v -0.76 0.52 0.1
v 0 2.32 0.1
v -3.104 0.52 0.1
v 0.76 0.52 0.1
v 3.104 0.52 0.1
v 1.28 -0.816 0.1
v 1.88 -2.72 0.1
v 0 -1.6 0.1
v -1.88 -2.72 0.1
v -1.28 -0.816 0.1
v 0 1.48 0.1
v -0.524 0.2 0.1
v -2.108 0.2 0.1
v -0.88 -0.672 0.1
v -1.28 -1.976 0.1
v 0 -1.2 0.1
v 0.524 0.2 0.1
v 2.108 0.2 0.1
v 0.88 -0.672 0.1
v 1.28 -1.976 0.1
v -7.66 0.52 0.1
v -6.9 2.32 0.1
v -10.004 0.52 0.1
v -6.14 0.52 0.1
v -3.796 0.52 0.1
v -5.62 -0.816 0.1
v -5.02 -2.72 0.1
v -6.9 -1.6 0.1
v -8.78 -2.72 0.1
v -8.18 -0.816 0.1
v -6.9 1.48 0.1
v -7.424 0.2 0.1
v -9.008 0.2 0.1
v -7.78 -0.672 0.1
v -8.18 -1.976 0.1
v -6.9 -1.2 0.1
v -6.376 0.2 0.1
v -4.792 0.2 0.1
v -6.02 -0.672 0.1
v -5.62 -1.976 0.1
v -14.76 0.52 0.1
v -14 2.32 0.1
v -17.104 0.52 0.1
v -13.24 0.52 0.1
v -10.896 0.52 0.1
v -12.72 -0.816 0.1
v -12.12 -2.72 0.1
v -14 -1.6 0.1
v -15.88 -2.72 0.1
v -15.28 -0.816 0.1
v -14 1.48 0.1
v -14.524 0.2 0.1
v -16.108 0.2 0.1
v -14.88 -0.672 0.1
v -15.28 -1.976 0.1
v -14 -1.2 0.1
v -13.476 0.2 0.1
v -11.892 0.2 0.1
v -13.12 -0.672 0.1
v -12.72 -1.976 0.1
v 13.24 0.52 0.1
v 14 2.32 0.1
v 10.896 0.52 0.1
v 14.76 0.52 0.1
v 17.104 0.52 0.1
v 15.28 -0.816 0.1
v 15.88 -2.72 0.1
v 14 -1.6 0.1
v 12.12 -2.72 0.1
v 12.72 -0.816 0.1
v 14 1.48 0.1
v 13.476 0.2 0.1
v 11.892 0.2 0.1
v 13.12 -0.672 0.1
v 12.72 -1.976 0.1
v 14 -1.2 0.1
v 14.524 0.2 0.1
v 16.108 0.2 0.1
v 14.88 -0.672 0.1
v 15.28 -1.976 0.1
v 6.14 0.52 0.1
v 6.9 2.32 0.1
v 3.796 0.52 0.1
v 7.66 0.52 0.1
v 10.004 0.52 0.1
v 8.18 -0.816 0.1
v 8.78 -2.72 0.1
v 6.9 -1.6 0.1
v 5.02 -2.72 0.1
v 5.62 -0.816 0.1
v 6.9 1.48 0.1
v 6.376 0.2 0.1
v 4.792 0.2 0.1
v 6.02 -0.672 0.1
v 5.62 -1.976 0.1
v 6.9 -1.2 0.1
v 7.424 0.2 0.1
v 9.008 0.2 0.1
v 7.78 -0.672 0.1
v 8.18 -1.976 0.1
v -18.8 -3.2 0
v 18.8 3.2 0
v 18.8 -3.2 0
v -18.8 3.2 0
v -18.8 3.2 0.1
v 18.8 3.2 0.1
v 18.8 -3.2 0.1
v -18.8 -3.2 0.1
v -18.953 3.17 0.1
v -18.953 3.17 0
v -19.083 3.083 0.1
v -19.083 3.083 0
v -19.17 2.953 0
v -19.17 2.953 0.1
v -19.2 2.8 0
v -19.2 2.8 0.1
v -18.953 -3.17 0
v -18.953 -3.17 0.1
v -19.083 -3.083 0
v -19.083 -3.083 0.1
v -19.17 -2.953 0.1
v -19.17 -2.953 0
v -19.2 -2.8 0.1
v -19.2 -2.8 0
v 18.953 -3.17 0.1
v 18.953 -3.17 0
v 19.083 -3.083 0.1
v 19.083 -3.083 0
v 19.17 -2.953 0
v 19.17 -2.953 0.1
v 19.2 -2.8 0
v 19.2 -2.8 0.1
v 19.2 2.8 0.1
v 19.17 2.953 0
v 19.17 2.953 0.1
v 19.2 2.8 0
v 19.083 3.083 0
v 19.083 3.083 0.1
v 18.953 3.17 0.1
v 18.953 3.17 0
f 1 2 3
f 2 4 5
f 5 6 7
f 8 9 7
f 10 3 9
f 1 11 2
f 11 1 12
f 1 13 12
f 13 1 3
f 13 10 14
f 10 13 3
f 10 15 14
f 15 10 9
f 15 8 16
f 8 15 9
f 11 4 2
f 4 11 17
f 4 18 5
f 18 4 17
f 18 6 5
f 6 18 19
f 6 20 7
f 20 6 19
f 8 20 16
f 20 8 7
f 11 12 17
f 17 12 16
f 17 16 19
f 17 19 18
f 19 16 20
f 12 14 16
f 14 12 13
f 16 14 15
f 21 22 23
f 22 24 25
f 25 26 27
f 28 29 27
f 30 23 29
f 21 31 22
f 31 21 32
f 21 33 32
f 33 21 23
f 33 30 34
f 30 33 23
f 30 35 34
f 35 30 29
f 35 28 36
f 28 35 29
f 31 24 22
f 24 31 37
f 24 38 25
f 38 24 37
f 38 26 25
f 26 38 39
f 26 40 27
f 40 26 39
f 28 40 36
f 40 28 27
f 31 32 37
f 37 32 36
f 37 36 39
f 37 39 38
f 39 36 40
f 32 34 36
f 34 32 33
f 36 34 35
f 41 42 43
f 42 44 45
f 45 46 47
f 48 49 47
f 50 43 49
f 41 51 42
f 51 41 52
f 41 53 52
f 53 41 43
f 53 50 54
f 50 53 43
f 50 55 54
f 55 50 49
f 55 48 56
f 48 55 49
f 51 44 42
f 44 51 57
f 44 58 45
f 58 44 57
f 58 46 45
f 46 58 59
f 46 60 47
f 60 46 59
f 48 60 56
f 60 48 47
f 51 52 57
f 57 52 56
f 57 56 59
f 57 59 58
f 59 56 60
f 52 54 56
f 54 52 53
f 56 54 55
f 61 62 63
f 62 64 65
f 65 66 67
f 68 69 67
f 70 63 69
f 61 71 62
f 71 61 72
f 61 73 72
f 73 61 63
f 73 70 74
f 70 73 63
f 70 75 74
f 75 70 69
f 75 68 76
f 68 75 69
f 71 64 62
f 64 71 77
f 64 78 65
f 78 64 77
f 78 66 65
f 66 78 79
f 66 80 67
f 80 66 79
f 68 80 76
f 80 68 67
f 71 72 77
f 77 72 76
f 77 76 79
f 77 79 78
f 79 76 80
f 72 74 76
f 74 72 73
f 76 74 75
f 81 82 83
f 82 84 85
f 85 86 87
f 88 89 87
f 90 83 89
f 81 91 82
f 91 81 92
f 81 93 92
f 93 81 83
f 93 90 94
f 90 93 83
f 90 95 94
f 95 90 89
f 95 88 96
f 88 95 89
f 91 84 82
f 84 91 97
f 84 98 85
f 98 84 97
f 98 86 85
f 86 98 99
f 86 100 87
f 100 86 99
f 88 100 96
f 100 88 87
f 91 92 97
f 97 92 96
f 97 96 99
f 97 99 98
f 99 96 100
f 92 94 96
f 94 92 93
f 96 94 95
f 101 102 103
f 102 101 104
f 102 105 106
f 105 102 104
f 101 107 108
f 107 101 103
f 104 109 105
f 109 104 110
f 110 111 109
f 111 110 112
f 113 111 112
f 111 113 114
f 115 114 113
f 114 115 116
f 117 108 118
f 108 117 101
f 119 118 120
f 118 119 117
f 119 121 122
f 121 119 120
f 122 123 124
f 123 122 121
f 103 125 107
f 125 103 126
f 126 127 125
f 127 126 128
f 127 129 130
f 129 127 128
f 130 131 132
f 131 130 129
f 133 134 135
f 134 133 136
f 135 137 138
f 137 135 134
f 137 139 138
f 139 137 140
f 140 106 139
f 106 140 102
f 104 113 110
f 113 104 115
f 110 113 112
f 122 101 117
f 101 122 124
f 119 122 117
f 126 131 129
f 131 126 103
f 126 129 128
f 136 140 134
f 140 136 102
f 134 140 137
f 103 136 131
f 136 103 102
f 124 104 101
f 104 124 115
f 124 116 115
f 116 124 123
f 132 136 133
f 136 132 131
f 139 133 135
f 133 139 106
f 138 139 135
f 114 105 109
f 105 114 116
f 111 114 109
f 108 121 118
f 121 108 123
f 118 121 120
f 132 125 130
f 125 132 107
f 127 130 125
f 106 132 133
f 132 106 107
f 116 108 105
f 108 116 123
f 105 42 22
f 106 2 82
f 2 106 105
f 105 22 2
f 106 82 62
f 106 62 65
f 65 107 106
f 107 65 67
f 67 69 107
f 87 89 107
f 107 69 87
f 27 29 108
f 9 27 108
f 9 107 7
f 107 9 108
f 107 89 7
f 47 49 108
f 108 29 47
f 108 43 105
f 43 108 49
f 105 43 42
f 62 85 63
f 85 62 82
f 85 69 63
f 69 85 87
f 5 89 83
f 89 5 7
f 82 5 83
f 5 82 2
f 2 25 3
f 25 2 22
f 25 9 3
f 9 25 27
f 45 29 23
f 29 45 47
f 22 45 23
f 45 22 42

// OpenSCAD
// file: s/4121723s10.scad
use <../../lib.scad>
function ldraw_lib__s__4121723s10() = [
// 0 ~Sticker with 5 Red Black Outlined Stars and Transparent Background -  Single Star
// 0 Name: s\4121723s10.dat
// 0 Author: Ulrich Röder [UR]
// 0 !LDRAW_ORG Subpart UPDATE 2022-06
// 0 !LICENSE Licensed under CC BY 2.0 and CC BY 4.0 : see CAreadme.txt
// 
// 0 BFC CERTIFY CCW
  [0,"BFC","CERTIFY"],
  [0,"BFC","CCW"],
// 
// 0 !HISTORY 2022-12-20 [PTadmin] Official Update 2022-06
// 
// 
// 3 16 -1.9 -.25 1.3 0 -.25 5.8 -7.76 -.25 1.3
  [3,16,-1.9,-.25,1.3,0,-.25,5.8,-7.76,-.25,1.3],
// 3 16 0 -.25 5.8 1.9 -.25 1.3 7.76 -.25 1.3
  [3,16,0,-.25,5.8,1.9,-.25,1.3,7.76,-.25,1.3],
// 3 16 7.76 -.25 1.3 3.2 -.25 -2.04 4.7 -.25 -6.8
  [3,16,7.76,-.25,1.3,3.2,-.25,-2.04,4.7,-.25,-6.8],
// 3 16 0 -.25 -4 -4.7 -.25 -6.8 4.7 -.25 -6.8
  [3,16,0,-.25,-4,-4.7,-.25,-6.8,4.7,-.25,-6.8],
// 3 16 -3.2 -.25 -2.04 -7.76 -.25 1.3 -4.7 -.25 -6.8
  [3,16,-3.2,-.25,-2.04,-7.76,-.25,1.3,-4.7,-.25,-6.8],
// 
// 0 BFC NOCLIP
  [0,"BFC","NOCLIP"],
// 4 0 0 -.25 5.8 -1.9 -.25 1.3 -1.31 -.25 .5 0 -.25 3.7
  [4,0,0,-.25,5.8,-1.9,-.25,1.3,-1.31,-.25,.5,0,-.25,3.7],
// 4 0 -5.27 -.25 .5 -1.31 -.25 .5 -1.9 -.25 1.3 -7.76 -.25 1.3
  [4,0,-5.27,-.25,.5,-1.31,-.25,.5,-1.9,-.25,1.3,-7.76,-.25,1.3],
// 4 0 -2.2 -.25 -1.68 -5.27 -.25 .5 -7.76 -.25 1.3 -3.2 -.25 -2.04
  [4,0,-2.2,-.25,-1.68,-5.27,-.25,.5,-7.76,-.25,1.3,-3.2,-.25,-2.04],
// 4 0 -2.2 -.25 -1.68 -3.2 -.25 -2.04 -4.7 -.25 -6.8 -3.2 -.25 -4.94
  [4,0,-2.2,-.25,-1.68,-3.2,-.25,-2.04,-4.7,-.25,-6.8,-3.2,-.25,-4.94],
// 4 0 0 -.25 -3 -3.2 -.25 -4.94 -4.7 -.25 -6.8 0 -.25 -4
  [4,0,0,-.25,-3,-3.2,-.25,-4.94,-4.7,-.25,-6.8,0,-.25,-4],
// 4 0 1.31 -.25 .5 1.9 -.25 1.3 0 -.25 5.8 0 -.25 3.7
  [4,0,1.31,-.25,.5,1.9,-.25,1.3,0,-.25,5.8,0,-.25,3.7],
// 4 0 1.9 -.25 1.3 1.31 -.25 .5 5.27 -.25 .5 7.76 -.25 1.3
  [4,0,1.9,-.25,1.3,1.31,-.25,.5,5.27,-.25,.5,7.76,-.25,1.3],
// 4 0 7.76 -.25 1.3 5.27 -.25 .5 2.2 -.25 -1.68 3.2 -.25 -2.04
  [4,0,7.76,-.25,1.3,5.27,-.25,.5,2.2,-.25,-1.68,3.2,-.25,-2.04],
// 4 0 4.7 -.25 -6.8 3.2 -.25 -2.04 2.2 -.25 -1.68 3.2 -.25 -4.94
  [4,0,4.7,-.25,-6.8,3.2,-.25,-2.04,2.2,-.25,-1.68,3.2,-.25,-4.94],
// 4 0 4.7 -.25 -6.8 3.2 -.25 -4.94 0 -.25 -3 0 -.25 -4
  [4,0,4.7,-.25,-6.8,3.2,-.25,-4.94,0,-.25,-3,0,-.25,-4],
// 
// 3 4 0 -.25 3.7 -1.31 -.25 .5 1.31 -.25 .5
  [3,4,0,-.25,3.7,-1.31,-.25,.5,1.31,-.25,.5],
// 3 4 1.31 -.25 .5 -1.31 -.25 .5 0 -.25 -3
  [3,4,1.31,-.25,.5,-1.31,-.25,.5,0,-.25,-3],
// 3 4 1.31 -.25 .5 0 -.25 -3 2.2 -.25 -1.68
  [3,4,1.31,-.25,.5,0,-.25,-3,2.2,-.25,-1.68],
// 3 4 1.31 -.25 .5 2.2 -.25 -1.68 5.27 -.25 .5
  [3,4,1.31,-.25,.5,2.2,-.25,-1.68,5.27,-.25,.5],
// 3 4 2.2 -.25 -1.68 0 -.25 -3 3.2 -.25 -4.94
  [3,4,2.2,-.25,-1.68,0,-.25,-3,3.2,-.25,-4.94],
// 3 4 -1.31 -.25 .5 -2.2 -.25 -1.68 0 -.25 -3
  [3,4,-1.31,-.25,.5,-2.2,-.25,-1.68,0,-.25,-3],
// 3 4 -2.2 -.25 -1.68 -1.31 -.25 .5 -5.27 -.25 .5
  [3,4,-2.2,-.25,-1.68,-1.31,-.25,.5,-5.27,-.25,.5],
// 3 4 0 -.25 -3 -2.2 -.25 -1.68 -3.2 -.25 -4.94
  [3,4,0,-.25,-3,-2.2,-.25,-1.68,-3.2,-.25,-4.94],
// 
];
module ldraw_lib__s__4121723s10(step=0, col=false, unit=2/5, alt=false, line=0.2, solid=!$preview)
    makepoly(ldraw_lib__s__4121723s10(), step=step, col=col, unit=unit, alt=alt, line=line, solid=solid);
ldraw_lib__s__4121723s10(line=0.2);
// file: ../p/box3u12.scad
use <../lib.scad>
function ldraw_lib__box3u12() = [
// 0 Box with 3 Parallel Faces without Any Edges
// 0 Name: box3u12.dat
// 0 Author: J.C. Tchang [tchang]
// 0 !LDRAW_ORG Primitive UPDATE 2014-02
// 0 !LICENSE Licensed under CC BY 2.0 and CC BY 4.0 : see CAreadme.txt
// 
// 0 BFC CERTIFY CCW
  [0,"BFC","CERTIFY"],
  [0,"BFC","CCW"],
// 
// 0 !HISTORY 2014-12-23 [PTadmin] Official Update 2014-02
// 
// 
// 4 16 -1 1 1 1 1 1 1 1 -1 -1 1 -1
  [4,16,-1,1,1,1,1,1,1,1,-1,-1,1,-1],
// 4 16 -1 1 1 -1 0 1 1 0 1 1 1 1
  [4,16,-1,1,1,-1,0,1,1,0,1,1,1,1],
// 4 16 1 1 -1 1 0 -1 -1 0 -1 -1 1 -1
  [4,16,1,1,-1,1,0,-1,-1,0,-1,-1,1,-1],
];
module ldraw_lib__box3u12(step=0, col=false, unit=2/5, alt=false, line=0.2, solid=!$preview)
    makepoly(ldraw_lib__box3u12(), step=step, col=col, unit=unit, alt=alt, line=line, solid=solid);
ldraw_lib__box3u12(line=0.2);
// file: ../p/1-4cyli.scad
use <../lib.scad>
function ldraw_lib__1_4cyli() = [
// 0 Cylinder 0.25
// 0 Name: 1-4cyli.dat
// 0 Author: James Jessiman
// 0 !LDRAW_ORG Primitive UPDATE 2012-01
// 0 !LICENSE Licensed under CC BY 2.0 and CC BY 4.0 : see CAreadme.txt
// 
// 0 BFC CERTIFY CCW
  [0,"BFC","CERTIFY"],
  [0,"BFC","CCW"],
// 
// 0 !HISTORY 2002-03-23 [sbliss] Added BFC statement.
// 0 !HISTORY 2002-04-25 [PTadmin] Official Update 2002-02
// 0 !HISTORY 2007-06-22 [PTadmin] Header formatted for Contributor Agreement
// 0 !HISTORY 2008-07-01 [PTadmin] Official Update 2008-01
// 0 !HISTORY 2012-02-16 [Philo] Changed to CCW
// 0 !HISTORY 2012-03-30 [PTadmin] Official Update 2012-01
// 
// 
// 4 16 1 1 0 0.9239 1 0.3827 0.9239 0 0.3827 1 0 0
  [4,16,1,1,0,0.9239,1,0.3827,0.9239,0,0.3827,1,0,0],
// 5 24 1 0 0 1 1 0 0.9239 0 0.3827 1 0 -1
  [5,24,1,0,0,1,1,0,0.9239,0,0.3827,1,0,-1],
// 4 16 0.9239 1 0.3827 0.7071 1 0.7071 0.7071 0 0.7071 0.9239 0 0.3827
  [4,16,0.9239,1,0.3827,0.7071,1,0.7071,0.7071,0,0.7071,0.9239,0,0.3827],
// 5 24 0.9239 0 0.3827 0.9239 1 0.3827 0.7071 0 0.7071 1 0 0
  [5,24,0.9239,0,0.3827,0.9239,1,0.3827,0.7071,0,0.7071,1,0,0],
// 4 16 0.7071 1 0.7071 0.3827 1 0.9239 0.3827 0 0.9239 0.7071 0 0.7071
  [4,16,0.7071,1,0.7071,0.3827,1,0.9239,0.3827,0,0.9239,0.7071,0,0.7071],
// 5 24 0.7071 0 0.7071 0.7071 1 0.7071 0.3827 0 0.9239 0.9239 0 0.3827
  [5,24,0.7071,0,0.7071,0.7071,1,0.7071,0.3827,0,0.9239,0.9239,0,0.3827],
// 4 16 0.3827 1 0.9239 0 1 1 0 0 1 0.3827 0 0.9239
  [4,16,0.3827,1,0.9239,0,1,1,0,0,1,0.3827,0,0.9239],
// 5 24 0.3827 0 0.9239 0.3827 1 0.9239 0 0 1 0.7071 0 0.7071
  [5,24,0.3827,0,0.9239,0.3827,1,0.9239,0,0,1,0.7071,0,0.7071],
// 5 24 0 0 1 0 1 1 0.3827 0 0.9239 -1 0 1
  [5,24,0,0,1,0,1,1,0.3827,0,0.9239,-1,0,1],
];
module ldraw_lib__1_4cyli(step=0, col=false, unit=2/5, alt=false, line=0.2, solid=!$preview)
    makepoly(ldraw_lib__1_4cyli(), step=step, col=col, unit=unit, alt=alt, line=line, solid=solid);
ldraw_lib__1_4cyli(line=0.2);
// file: ../p/1-4chrd.scad
use <../lib.scad>
function ldraw_lib__1_4chrd() = [
// 0 Chord 0.25
// 0 Name: 1-4chrd.dat
// 0 Author: Tony Hafner [hafhead]
// 0 !LDRAW_ORG Primitive UPDATE 2012-02
// 0 !LICENSE Licensed under CC BY 2.0 and CC BY 4.0 : see CAreadme.txt
// 
// 0 BFC CERTIFY CCW
  [0,"BFC","CERTIFY"],
  [0,"BFC","CCW"],
// 
// 0 !HISTORY 2004-04-22 [PTadmin] Official Update 2004-02
// 0 !HISTORY 2007-10-09 [PTadmin] Header formatted for Contributor Agreement
// 0 !HISTORY 2008-07-01 [PTadmin] Official Update 2008-01
// 0 !HISTORY 2012-08-02 [MMR1988] Re-creation with PrimGen2 and Rectifier
// 0 !HISTORY 2012-08-09 [PTadmin] Official Update 2012-02
// 
// 
// 4 16 0.9239 0 0.3827 0.3827 0 0.9239 0 0 1 1 0 0
  [4,16,0.9239,0,0.3827,0.3827,0,0.9239,0,0,1,1,0,0],
// 3 16 0.7071 0 0.7071 0.3827 0 0.9239 0.9239 0 0.3827
  [3,16,0.7071,0,0.7071,0.3827,0,0.9239,0.9239,0,0.3827],
];
module ldraw_lib__1_4chrd(step=0, col=false, unit=2/5, alt=false, line=0.2, solid=!$preview)
    makepoly(ldraw_lib__1_4chrd(), step=step, col=col, unit=unit, alt=alt, line=line, solid=solid);
ldraw_lib__1_4chrd(line=0.2);
// main file
use <../lib.scad>
use <../p/1-4chrd.scad>
use <../p/1-4cyli.scad>
use <../p/box3u12.scad>
use <s/4121723s10.scad>
function ldraw_lib__4121723n() = [
// 0 Sticker  0.8 x  4.8 with  5 Red Black Outlined Stars and Transparent Background
// 0 Name: 4121723n.dat
// 0 Author: Ulrich Röder [UR]
// 0 !LDRAW_ORG Part UPDATE 2022-06
// 0 !LICENSE Licensed under CC BY 2.0 and CC BY 4.0 : see CAreadme.txt
// 
// 0 BFC CERTIFY CCW
  [0,"BFC","CERTIFY"],
  [0,"BFC","CCW"],
// 
// 0 !KEYWORDS Model Team, Racing Truck, Set 5563
// 
// 0 !HISTORY 2022-12-20 [PTadmin] Official Update 2022-06
// 
// 
// 0 // Stars
// 
// 1 16 0 0 0 1 0 0 0 1 0 0 0 1 s\4121723s10.dat
  [1,16,0,0,0,1,0,0,0,1,0,0,0,1, ldraw_lib__s__4121723s10()],
// 1 16 -17.25 0 0 1 0 0 0 1 0 0 0 1 s\4121723s10.dat
  [1,16,-17.25,0,0,1,0,0,0,1,0,0,0,1, ldraw_lib__s__4121723s10()],
// 1 16 -35 0 0 1 0 0 0 1 0 0 0 1 s\4121723s10.dat
  [1,16,-35,0,0,1,0,0,0,1,0,0,0,1, ldraw_lib__s__4121723s10()],
// 1 16 35 0 0 1 0 0 0 1 0 0 0 1 s\4121723s10.dat
  [1,16,35,0,0,1,0,0,0,1,0,0,0,1, ldraw_lib__s__4121723s10()],
// 1 16 17.25 0 0 1 0 0 0 1 0 0 0 1 s\4121723s10.dat
  [1,16,17.25,0,0,1,0,0,0,1,0,0,0,1, ldraw_lib__s__4121723s10()],
// 
// 0 // Body
// 1 16 0 -0.25 0 47 0 0 0 0.25 0 0 0 8 box3u12.dat
  [1,16,0,-0.25,0,47,0,0,0,0.25,0,0,0,8, ldraw_lib__box3u12()],
// 1 16 -47 0 7 0 0 -1 0 -.25 0 1 0 0 1-4cyli.dat
  [1,16,-47,0,7,0,0,-1,0,-.25,0,1,0,0, ldraw_lib__1_4cyli()],
// 1 16 -47 0 -7 0 0 -1 0 -.25 0 -1 0 0 1-4cyli.dat
  [1,16,-47,0,-7,0,0,-1,0,-.25,0,-1,0,0, ldraw_lib__1_4cyli()],
// 1 16 47 0 -7 0 0 1 0 -.25 0 -1 0 0 1-4cyli.dat
  [1,16,47,0,-7,0,0,1,0,-.25,0,-1,0,0, ldraw_lib__1_4cyli()],
// 1 16 47 0 7 1 0 0 0 -.25 0 0 0 1 1-4cyli.dat
  [1,16,47,0,7,1,0,0,0,-.25,0,0,0,1, ldraw_lib__1_4cyli()],
// 1 16 -47 0 7 0 0 -1 0 -1 0 1 0 0 1-4chrd.dat
  [1,16,-47,0,7,0,0,-1,0,-1,0,1,0,0, ldraw_lib__1_4chrd()],
// 1 16 -47 0 -7 0 0 -1 0 -1 0 -1 0 0 1-4chrd.dat
  [1,16,-47,0,-7,0,0,-1,0,-1,0,-1,0,0, ldraw_lib__1_4chrd()],
// 1 16 47 0 -7 0 0 1 0 -1 0 -1 0 0 1-4chrd.dat
  [1,16,47,0,-7,0,0,1,0,-1,0,-1,0,0, ldraw_lib__1_4chrd()],
// 1 16 47 0 7 1 0 0 0 -1 0 0 0 1 1-4chrd.dat
  [1,16,47,0,7,1,0,0,0,-1,0,0,0,1, ldraw_lib__1_4chrd()],
// 4 16 47 0 8 48 0 7 48 0 -7 47 0 -8
  [4,16,47,0,8,48,0,7,48,0,-7,47,0,-8],
// 4 16 -47 0 -8 -48 0 -7 -48 0 7 -47 0 8
  [4,16,-47,0,-8,-48,0,-7,-48,0,7,-47,0,8],
// 4 16 -48 -.25 7 -48 0 7 -48 0 -7 -48 -.25 -7
  [4,16,-48,-.25,7,-48,0,7,-48,0,-7,-48,-.25,-7],
// 4 16 48 0 -7 48 0 7 48 -.25 7 48 -.25 -7
  [4,16,48,0,-7,48,0,7,48,-.25,7,48,-.25,-7],
// 
// 0 // Frontface
// 1 16 47 -.25 7 1 0 0 0 1 0 0 0 1 1-4chrd.dat
  [1,16,47,-.25,7,1,0,0,0,1,0,0,0,1, ldraw_lib__1_4chrd()],
// 1 16 -47 -.25 7 0 0 -1 0 1 0 1 0 0 1-4chrd.dat
  [1,16,-47,-.25,7,0,0,-1,0,1,0,1,0,0, ldraw_lib__1_4chrd()],
// 1 16 -47 -.25 -7 0 0 -1 0 1 0 -1 0 0 1-4chrd.dat
  [1,16,-47,-.25,-7,0,0,-1,0,1,0,-1,0,0, ldraw_lib__1_4chrd()],
// 1 16 47 -.25 -7 0 0 1 0 1 0 -1 0 0 1-4chrd.dat
  [1,16,47,-.25,-7,0,0,1,0,1,0,-1,0,0, ldraw_lib__1_4chrd()],
// 4 16 48 -.25 -7 48 -.25 7 47 -.25 8 47 -.25 -8
  [4,16,48,-.25,-7,48,-.25,7,47,-.25,8,47,-.25,-8],
// 4 16 -48 -.25 7 -48 -.25 -7 -47 -.25 -8 -47 -.25 8
  [4,16,-48,-.25,7,-48,-.25,-7,-47,-.25,-8,-47,-.25,8],
// 3 16 -47 -.25 8 -35 -.25 5.8 -17.25 -.25 5.8
  [3,16,-47,-.25,8,-35,-.25,5.8,-17.25,-.25,5.8],
// 4 16 47 -.25 8 -47 -.25 8 0 -.25 5.8 17.25 -.25 5.8
  [4,16,47,-.25,8,-47,-.25,8,0,-.25,5.8,17.25,-.25,5.8],
// 3 16 -47 -.25 8 -17.25 -.25 5.8 0 -.25 5.8
  [3,16,-47,-.25,8,-17.25,-.25,5.8,0,-.25,5.8],
// 3 16 47 -.25 8 17.25 -.25 5.8 35 -.25 5.8
  [3,16,47,-.25,8,17.25,-.25,5.8,35,-.25,5.8],
// 3 16 47 -.25 8 35 -.25 5.8 42.76 -.25 1.3
  [3,16,47,-.25,8,35,-.25,5.8,42.76,-.25,1.3],
// 4 16 47 -.25 8 42.76 -.25 1.3 39.7 -.25 -6.8 47 -.25 -8
  [4,16,47,-.25,8,42.76,-.25,1.3,39.7,-.25,-6.8,47,-.25,-8],
// 3 16 39.7 -.25 -6.8 30.3 -.25 -6.8 47 -.25 -8
  [3,16,39.7,-.25,-6.8,30.3,-.25,-6.8,47,-.25,-8],
// 3 16 21.95 -.25 -6.8 12.55 -.25 -6.8 47 -.25 -8
  [3,16,21.95,-.25,-6.8,12.55,-.25,-6.8,47,-.25,-8],
// 3 16 47 -.25 -8 30.3 -.25 -6.8 21.95 -.25 -6.8
  [3,16,47,-.25,-8,30.3,-.25,-6.8,21.95,-.25,-6.8],
// 3 16 -12.55 -.25 -6.8 -21.95 -.25 -6.8 -47 -.25 -8
  [3,16,-12.55,-.25,-6.8,-21.95,-.25,-6.8,-47,-.25,-8],
// 3 16 -4.7 -.25 -6.8 -12.55 -.25 -6.8 -47 -.25 -8
  [3,16,-4.7,-.25,-6.8,-12.55,-.25,-6.8,-47,-.25,-8],
// 4 16 -47 -.25 -8 47 -.25 -8 4.7 -.25 -6.8 -4.7 -.25 -6.8
  [4,16,-47,-.25,-8,47,-.25,-8,4.7,-.25,-6.8,-4.7,-.25,-6.8],
// 3 16 47 -.25 -8 12.55 -.25 -6.8 4.7 -.25 -6.8
  [3,16,47,-.25,-8,12.55,-.25,-6.8,4.7,-.25,-6.8],
// 3 16 -30.3 -.25 -6.8 -39.7 -.25 -6.8 -47 -.25 -8
  [3,16,-30.3,-.25,-6.8,-39.7,-.25,-6.8,-47,-.25,-8],
// 3 16 -47 -.25 -8 -21.95 -.25 -6.8 -30.3 -.25 -6.8
  [3,16,-47,-.25,-8,-21.95,-.25,-6.8,-30.3,-.25,-6.8],
// 4 16 -47 -.25 -8 -39.7 -.25 -6.8 -42.76 -.25 1.3 -47 -.25 8
  [4,16,-47,-.25,-8,-39.7,-.25,-6.8,-42.76,-.25,1.3,-47,-.25,8],
// 3 16 -47 -.25 8 -42.76 -.25 1.3 -35 -.25 5.8
  [3,16,-47,-.25,8,-42.76,-.25,1.3,-35,-.25,5.8],
// 4 16 17.25 -.25 5.8 25.01 -.25 1.3 27.24 -.25 1.3 35 -.25 5.8
  [4,16,17.25,-.25,5.8,25.01,-.25,1.3,27.24,-.25,1.3,35,-.25,5.8],
// 4 16 27.24 -.25 1.3 25.01 -.25 1.3 21.95 -.25 -6.8 30.3 -.25 -6.8
  [4,16,27.24,-.25,1.3,25.01,-.25,1.3,21.95,-.25,-6.8,30.3,-.25,-6.8],
// 4 16 9.49 -.25 1.3 7.76 -.25 1.3 4.7 -.25 -6.8 12.55 -.25 -6.8
  [4,16,9.49,-.25,1.3,7.76,-.25,1.3,4.7,-.25,-6.8,12.55,-.25,-6.8],
// 4 16 0 -.25 5.8 7.76 -.25 1.3 9.49 -.25 1.3 17.25 -.25 5.8
  [4,16,0,-.25,5.8,7.76,-.25,1.3,9.49,-.25,1.3,17.25,-.25,5.8],
// 4 16 -17.25 -.25 5.8 -9.49 -.25 1.3 -7.76 -.25 1.3 0 -.25 5.8
  [4,16,-17.25,-.25,5.8,-9.49,-.25,1.3,-7.76,-.25,1.3,0,-.25,5.8],
// 4 16 -7.76 -.25 1.3 -9.49 -.25 1.3 -12.55 -.25 -6.8 -4.7 -.25 -6.8
  [4,16,-7.76,-.25,1.3,-9.49,-.25,1.3,-12.55,-.25,-6.8,-4.7,-.25,-6.8],
// 4 16 -25.01 -.25 1.3 -27.24 -.25 1.3 -30.3 -.25 -6.8 -21.95 -.25 -6.8
  [4,16,-25.01,-.25,1.3,-27.24,-.25,1.3,-30.3,-.25,-6.8,-21.95,-.25,-6.8],
// 4 16 -35 -.25 5.8 -27.24 -.25 1.3 -25.01 -.25 1.3 -17.25 -.25 5.8
  [4,16,-35,-.25,5.8,-27.24,-.25,1.3,-25.01,-.25,1.3,-17.25,-.25,5.8],
];
module ldraw_lib__4121723n(step=0, col=false, unit=2/5, alt=false, line=0.2, solid=!$preview)
    makepoly(ldraw_lib__4121723n(), step=step, col=col, unit=unit, alt=alt, line=line, solid=solid);
ldraw_lib__4121723n(line=0.2);
